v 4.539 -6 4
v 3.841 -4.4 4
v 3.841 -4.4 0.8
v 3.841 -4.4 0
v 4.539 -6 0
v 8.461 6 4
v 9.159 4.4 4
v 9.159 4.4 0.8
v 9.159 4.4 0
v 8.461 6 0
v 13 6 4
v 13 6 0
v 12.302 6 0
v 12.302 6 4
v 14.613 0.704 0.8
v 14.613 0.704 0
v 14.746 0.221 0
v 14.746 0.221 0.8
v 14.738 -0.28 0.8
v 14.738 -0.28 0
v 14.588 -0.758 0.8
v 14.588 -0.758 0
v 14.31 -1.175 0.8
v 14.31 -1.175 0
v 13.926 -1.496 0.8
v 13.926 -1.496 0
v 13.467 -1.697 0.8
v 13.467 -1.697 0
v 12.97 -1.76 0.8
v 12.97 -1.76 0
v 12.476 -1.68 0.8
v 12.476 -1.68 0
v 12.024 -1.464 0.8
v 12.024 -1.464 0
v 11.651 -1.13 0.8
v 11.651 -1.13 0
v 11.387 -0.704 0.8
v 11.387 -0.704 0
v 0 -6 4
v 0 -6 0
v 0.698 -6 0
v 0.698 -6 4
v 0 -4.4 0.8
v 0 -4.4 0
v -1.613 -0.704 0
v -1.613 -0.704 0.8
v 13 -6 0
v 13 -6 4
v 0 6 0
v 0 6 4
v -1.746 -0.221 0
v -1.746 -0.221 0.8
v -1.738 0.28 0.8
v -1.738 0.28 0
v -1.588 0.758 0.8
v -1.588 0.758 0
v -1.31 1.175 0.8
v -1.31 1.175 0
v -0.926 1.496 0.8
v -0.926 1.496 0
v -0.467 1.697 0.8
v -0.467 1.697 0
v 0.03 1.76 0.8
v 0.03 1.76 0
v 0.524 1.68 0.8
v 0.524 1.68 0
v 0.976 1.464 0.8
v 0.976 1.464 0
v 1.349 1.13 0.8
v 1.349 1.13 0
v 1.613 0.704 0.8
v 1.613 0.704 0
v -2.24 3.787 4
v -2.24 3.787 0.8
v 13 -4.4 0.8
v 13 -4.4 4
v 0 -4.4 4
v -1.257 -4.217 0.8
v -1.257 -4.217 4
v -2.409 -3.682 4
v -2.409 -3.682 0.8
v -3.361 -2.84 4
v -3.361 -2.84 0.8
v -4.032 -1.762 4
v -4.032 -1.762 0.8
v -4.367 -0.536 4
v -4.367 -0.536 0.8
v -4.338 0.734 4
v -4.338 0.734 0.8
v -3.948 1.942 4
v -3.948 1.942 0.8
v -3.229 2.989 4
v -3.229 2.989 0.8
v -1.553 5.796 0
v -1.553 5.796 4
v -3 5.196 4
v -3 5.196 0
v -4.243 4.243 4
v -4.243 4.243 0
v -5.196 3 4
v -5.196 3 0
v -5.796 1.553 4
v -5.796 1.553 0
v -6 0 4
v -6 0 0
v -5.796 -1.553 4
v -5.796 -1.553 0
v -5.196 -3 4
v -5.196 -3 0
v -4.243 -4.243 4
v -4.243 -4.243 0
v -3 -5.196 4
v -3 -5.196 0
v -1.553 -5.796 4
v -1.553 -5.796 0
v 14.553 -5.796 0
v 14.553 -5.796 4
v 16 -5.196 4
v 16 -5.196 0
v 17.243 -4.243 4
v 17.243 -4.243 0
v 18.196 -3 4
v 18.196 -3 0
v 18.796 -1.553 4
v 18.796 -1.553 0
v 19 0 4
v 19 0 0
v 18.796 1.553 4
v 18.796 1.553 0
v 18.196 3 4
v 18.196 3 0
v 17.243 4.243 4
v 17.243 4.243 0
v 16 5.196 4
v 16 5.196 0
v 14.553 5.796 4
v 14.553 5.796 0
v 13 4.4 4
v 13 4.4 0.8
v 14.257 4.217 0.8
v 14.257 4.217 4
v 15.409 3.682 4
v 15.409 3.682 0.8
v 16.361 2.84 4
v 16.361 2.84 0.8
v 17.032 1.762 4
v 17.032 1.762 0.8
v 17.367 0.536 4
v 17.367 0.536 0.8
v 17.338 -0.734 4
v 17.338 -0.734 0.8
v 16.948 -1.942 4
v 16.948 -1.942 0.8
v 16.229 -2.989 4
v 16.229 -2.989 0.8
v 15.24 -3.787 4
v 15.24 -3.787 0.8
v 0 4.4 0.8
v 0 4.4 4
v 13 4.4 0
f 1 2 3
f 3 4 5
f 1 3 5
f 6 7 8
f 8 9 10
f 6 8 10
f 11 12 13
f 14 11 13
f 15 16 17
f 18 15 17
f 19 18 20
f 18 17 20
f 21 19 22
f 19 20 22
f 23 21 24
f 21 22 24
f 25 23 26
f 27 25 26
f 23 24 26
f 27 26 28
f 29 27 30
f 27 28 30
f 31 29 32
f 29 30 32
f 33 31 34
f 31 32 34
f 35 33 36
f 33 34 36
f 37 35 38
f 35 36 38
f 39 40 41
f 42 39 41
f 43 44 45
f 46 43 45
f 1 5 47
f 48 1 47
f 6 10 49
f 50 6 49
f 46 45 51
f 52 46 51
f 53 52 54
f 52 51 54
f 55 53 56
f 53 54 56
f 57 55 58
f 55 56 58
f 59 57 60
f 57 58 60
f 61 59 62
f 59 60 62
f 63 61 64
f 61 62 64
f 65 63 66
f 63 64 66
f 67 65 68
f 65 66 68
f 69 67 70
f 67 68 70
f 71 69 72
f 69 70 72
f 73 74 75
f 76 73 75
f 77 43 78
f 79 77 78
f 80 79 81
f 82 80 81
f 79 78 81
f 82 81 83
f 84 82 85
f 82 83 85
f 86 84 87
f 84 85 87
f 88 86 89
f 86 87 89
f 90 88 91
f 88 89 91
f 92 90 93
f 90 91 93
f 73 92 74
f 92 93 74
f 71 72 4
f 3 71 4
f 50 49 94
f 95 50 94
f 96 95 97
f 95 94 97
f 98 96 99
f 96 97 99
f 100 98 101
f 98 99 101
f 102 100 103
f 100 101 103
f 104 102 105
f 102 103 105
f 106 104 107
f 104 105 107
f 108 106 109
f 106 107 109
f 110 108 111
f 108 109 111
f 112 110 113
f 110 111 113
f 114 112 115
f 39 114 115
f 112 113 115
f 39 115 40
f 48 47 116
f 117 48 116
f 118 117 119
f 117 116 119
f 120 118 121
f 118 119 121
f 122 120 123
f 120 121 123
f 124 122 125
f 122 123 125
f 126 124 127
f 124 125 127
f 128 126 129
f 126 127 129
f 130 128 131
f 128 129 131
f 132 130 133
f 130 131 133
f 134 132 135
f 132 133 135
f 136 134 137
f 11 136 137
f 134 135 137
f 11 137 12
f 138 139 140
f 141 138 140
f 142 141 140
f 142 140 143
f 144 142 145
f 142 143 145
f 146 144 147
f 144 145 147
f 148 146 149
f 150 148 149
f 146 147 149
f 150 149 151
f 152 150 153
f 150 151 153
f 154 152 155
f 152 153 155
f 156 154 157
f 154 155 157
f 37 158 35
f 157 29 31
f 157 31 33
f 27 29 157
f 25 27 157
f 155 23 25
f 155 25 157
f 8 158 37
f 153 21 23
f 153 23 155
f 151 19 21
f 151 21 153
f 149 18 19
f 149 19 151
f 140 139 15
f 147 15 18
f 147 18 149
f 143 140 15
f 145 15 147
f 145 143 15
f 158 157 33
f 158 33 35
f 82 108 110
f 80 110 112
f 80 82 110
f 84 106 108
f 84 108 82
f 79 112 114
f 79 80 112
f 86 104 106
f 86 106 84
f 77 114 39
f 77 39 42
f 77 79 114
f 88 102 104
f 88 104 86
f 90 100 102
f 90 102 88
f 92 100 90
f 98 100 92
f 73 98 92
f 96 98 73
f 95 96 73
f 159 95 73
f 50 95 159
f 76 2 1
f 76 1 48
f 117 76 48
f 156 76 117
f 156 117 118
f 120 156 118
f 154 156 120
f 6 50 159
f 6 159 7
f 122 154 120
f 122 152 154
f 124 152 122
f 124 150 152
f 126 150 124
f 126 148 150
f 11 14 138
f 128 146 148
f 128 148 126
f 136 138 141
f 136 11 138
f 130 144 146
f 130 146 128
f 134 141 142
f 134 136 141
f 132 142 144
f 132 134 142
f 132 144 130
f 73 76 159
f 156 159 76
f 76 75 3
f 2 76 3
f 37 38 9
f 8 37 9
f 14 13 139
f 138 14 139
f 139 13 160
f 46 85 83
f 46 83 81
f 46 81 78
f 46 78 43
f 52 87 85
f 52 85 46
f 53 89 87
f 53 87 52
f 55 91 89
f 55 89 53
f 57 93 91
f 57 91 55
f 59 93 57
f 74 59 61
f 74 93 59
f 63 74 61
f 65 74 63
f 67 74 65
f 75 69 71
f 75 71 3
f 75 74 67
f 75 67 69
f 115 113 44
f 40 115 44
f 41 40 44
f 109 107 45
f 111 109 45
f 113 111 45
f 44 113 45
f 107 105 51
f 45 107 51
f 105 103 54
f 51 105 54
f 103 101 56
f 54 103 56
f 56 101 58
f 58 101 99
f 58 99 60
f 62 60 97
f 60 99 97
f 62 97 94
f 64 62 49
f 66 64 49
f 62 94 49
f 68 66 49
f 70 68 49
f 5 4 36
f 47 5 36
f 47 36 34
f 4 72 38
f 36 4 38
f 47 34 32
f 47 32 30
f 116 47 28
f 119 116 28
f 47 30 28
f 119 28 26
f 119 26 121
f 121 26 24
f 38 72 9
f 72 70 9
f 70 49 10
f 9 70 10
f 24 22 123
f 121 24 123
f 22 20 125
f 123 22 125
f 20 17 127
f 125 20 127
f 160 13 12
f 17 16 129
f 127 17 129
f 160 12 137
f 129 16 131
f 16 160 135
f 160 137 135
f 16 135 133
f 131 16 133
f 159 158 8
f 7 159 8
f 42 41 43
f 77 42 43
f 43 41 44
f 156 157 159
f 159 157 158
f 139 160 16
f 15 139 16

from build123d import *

# Parameters (mm, degrees)
F1_DEPTH = 4
F2_DEPTH = 0.8


# Not quite as in the source:
# - a feature names something its author has since deleted; it is built from what else it names


with BuildPart() as f1:
    # F0 (on Top) → F1 (new body)
    with BuildSketch(Plane.XY):
        with BuildLine():
            Line((8.4610678831, 6), (0, 6))
            ThreePointArc((0, 6), (-6, 0), (0, -6))
            Line((0, -6), (0.6982972488, -6))
            Line((0.6982972488, -6), (0, -4.4))
            ThreePointArc((0, -4.4), (-4.2440131224, -1.1611858666), (-2.2400400253, 3.7871124469))
            Line((-2.2400400253, 3.7871124469), (13, -4.4))
            Line((13, -4.4), (3.8406348682, -4.4))
            Line((3.8406348682, -4.4), (4.5389321169, -6))
            Line((4.5389321169, -6), (13, -6))
            ThreePointArc((13, -6), (19, 0), (13, 6))
            Line((13, 6), (12.3017027512, 6))
            Line((12.3017027512, 6), (13, 4.4))
            ThreePointArc((13, 4.4), (17.2440131224, 1.1611858666), (15.2400400253, -3.7871124469))
            Line((15.2400400253, -3.7871124469), (0, 4.4))
            Line((0, 4.4), (9.1593651318, 4.4))
            Line((9.1593651318, 4.4), (8.4610678831, 6))
        make_face()
    extrude(amount=F1_DEPTH)

    # F0 (on Top) → F2 (join)
    with BuildSketch(Plane.XY):
        with BuildLine():
            ThreePointArc((-2.2400400253, 3.7871124469), (-4.2440131224, -1.1611858666), (0, -4.4))
            Line((0, -4.4), (-0.8065333223, -2.552))
            Line((-0.8065333223, -2.552), (-1.6130666446, -0.704))
            ThreePointArc((-1.6130666446, -0.704), (-0.704, 1.6130666446), (1.6130666446, 0.704))
            Line((1.6130666446, 0.704), (3.8406348682, -4.4))
            Line((3.8406348682, -4.4), (13, -4.4))
            Line((13, -4.4), (-2.2400400253, 3.7871124469))
        make_face()
        with BuildLine():
            Line((11.3869333554, -0.704), (9.1593651318, 4.4))
            Line((9.1593651318, 4.4), (0, 4.4))
            Line((0, 4.4), (15.2400400253, -3.7871124469))
            ThreePointArc((15.2400400253, -3.7871124469), (17.2440131224, 1.1611858666), (13, 4.4))
            Line((13, 4.4), (14.6130666446, 0.704))
            ThreePointArc((14.6130666446, 0.704), (13.704, -1.6130666446), (11.3869333554, -0.704))
        make_face()
    extrude(amount=F2_DEPTH)


solid = f1.part
